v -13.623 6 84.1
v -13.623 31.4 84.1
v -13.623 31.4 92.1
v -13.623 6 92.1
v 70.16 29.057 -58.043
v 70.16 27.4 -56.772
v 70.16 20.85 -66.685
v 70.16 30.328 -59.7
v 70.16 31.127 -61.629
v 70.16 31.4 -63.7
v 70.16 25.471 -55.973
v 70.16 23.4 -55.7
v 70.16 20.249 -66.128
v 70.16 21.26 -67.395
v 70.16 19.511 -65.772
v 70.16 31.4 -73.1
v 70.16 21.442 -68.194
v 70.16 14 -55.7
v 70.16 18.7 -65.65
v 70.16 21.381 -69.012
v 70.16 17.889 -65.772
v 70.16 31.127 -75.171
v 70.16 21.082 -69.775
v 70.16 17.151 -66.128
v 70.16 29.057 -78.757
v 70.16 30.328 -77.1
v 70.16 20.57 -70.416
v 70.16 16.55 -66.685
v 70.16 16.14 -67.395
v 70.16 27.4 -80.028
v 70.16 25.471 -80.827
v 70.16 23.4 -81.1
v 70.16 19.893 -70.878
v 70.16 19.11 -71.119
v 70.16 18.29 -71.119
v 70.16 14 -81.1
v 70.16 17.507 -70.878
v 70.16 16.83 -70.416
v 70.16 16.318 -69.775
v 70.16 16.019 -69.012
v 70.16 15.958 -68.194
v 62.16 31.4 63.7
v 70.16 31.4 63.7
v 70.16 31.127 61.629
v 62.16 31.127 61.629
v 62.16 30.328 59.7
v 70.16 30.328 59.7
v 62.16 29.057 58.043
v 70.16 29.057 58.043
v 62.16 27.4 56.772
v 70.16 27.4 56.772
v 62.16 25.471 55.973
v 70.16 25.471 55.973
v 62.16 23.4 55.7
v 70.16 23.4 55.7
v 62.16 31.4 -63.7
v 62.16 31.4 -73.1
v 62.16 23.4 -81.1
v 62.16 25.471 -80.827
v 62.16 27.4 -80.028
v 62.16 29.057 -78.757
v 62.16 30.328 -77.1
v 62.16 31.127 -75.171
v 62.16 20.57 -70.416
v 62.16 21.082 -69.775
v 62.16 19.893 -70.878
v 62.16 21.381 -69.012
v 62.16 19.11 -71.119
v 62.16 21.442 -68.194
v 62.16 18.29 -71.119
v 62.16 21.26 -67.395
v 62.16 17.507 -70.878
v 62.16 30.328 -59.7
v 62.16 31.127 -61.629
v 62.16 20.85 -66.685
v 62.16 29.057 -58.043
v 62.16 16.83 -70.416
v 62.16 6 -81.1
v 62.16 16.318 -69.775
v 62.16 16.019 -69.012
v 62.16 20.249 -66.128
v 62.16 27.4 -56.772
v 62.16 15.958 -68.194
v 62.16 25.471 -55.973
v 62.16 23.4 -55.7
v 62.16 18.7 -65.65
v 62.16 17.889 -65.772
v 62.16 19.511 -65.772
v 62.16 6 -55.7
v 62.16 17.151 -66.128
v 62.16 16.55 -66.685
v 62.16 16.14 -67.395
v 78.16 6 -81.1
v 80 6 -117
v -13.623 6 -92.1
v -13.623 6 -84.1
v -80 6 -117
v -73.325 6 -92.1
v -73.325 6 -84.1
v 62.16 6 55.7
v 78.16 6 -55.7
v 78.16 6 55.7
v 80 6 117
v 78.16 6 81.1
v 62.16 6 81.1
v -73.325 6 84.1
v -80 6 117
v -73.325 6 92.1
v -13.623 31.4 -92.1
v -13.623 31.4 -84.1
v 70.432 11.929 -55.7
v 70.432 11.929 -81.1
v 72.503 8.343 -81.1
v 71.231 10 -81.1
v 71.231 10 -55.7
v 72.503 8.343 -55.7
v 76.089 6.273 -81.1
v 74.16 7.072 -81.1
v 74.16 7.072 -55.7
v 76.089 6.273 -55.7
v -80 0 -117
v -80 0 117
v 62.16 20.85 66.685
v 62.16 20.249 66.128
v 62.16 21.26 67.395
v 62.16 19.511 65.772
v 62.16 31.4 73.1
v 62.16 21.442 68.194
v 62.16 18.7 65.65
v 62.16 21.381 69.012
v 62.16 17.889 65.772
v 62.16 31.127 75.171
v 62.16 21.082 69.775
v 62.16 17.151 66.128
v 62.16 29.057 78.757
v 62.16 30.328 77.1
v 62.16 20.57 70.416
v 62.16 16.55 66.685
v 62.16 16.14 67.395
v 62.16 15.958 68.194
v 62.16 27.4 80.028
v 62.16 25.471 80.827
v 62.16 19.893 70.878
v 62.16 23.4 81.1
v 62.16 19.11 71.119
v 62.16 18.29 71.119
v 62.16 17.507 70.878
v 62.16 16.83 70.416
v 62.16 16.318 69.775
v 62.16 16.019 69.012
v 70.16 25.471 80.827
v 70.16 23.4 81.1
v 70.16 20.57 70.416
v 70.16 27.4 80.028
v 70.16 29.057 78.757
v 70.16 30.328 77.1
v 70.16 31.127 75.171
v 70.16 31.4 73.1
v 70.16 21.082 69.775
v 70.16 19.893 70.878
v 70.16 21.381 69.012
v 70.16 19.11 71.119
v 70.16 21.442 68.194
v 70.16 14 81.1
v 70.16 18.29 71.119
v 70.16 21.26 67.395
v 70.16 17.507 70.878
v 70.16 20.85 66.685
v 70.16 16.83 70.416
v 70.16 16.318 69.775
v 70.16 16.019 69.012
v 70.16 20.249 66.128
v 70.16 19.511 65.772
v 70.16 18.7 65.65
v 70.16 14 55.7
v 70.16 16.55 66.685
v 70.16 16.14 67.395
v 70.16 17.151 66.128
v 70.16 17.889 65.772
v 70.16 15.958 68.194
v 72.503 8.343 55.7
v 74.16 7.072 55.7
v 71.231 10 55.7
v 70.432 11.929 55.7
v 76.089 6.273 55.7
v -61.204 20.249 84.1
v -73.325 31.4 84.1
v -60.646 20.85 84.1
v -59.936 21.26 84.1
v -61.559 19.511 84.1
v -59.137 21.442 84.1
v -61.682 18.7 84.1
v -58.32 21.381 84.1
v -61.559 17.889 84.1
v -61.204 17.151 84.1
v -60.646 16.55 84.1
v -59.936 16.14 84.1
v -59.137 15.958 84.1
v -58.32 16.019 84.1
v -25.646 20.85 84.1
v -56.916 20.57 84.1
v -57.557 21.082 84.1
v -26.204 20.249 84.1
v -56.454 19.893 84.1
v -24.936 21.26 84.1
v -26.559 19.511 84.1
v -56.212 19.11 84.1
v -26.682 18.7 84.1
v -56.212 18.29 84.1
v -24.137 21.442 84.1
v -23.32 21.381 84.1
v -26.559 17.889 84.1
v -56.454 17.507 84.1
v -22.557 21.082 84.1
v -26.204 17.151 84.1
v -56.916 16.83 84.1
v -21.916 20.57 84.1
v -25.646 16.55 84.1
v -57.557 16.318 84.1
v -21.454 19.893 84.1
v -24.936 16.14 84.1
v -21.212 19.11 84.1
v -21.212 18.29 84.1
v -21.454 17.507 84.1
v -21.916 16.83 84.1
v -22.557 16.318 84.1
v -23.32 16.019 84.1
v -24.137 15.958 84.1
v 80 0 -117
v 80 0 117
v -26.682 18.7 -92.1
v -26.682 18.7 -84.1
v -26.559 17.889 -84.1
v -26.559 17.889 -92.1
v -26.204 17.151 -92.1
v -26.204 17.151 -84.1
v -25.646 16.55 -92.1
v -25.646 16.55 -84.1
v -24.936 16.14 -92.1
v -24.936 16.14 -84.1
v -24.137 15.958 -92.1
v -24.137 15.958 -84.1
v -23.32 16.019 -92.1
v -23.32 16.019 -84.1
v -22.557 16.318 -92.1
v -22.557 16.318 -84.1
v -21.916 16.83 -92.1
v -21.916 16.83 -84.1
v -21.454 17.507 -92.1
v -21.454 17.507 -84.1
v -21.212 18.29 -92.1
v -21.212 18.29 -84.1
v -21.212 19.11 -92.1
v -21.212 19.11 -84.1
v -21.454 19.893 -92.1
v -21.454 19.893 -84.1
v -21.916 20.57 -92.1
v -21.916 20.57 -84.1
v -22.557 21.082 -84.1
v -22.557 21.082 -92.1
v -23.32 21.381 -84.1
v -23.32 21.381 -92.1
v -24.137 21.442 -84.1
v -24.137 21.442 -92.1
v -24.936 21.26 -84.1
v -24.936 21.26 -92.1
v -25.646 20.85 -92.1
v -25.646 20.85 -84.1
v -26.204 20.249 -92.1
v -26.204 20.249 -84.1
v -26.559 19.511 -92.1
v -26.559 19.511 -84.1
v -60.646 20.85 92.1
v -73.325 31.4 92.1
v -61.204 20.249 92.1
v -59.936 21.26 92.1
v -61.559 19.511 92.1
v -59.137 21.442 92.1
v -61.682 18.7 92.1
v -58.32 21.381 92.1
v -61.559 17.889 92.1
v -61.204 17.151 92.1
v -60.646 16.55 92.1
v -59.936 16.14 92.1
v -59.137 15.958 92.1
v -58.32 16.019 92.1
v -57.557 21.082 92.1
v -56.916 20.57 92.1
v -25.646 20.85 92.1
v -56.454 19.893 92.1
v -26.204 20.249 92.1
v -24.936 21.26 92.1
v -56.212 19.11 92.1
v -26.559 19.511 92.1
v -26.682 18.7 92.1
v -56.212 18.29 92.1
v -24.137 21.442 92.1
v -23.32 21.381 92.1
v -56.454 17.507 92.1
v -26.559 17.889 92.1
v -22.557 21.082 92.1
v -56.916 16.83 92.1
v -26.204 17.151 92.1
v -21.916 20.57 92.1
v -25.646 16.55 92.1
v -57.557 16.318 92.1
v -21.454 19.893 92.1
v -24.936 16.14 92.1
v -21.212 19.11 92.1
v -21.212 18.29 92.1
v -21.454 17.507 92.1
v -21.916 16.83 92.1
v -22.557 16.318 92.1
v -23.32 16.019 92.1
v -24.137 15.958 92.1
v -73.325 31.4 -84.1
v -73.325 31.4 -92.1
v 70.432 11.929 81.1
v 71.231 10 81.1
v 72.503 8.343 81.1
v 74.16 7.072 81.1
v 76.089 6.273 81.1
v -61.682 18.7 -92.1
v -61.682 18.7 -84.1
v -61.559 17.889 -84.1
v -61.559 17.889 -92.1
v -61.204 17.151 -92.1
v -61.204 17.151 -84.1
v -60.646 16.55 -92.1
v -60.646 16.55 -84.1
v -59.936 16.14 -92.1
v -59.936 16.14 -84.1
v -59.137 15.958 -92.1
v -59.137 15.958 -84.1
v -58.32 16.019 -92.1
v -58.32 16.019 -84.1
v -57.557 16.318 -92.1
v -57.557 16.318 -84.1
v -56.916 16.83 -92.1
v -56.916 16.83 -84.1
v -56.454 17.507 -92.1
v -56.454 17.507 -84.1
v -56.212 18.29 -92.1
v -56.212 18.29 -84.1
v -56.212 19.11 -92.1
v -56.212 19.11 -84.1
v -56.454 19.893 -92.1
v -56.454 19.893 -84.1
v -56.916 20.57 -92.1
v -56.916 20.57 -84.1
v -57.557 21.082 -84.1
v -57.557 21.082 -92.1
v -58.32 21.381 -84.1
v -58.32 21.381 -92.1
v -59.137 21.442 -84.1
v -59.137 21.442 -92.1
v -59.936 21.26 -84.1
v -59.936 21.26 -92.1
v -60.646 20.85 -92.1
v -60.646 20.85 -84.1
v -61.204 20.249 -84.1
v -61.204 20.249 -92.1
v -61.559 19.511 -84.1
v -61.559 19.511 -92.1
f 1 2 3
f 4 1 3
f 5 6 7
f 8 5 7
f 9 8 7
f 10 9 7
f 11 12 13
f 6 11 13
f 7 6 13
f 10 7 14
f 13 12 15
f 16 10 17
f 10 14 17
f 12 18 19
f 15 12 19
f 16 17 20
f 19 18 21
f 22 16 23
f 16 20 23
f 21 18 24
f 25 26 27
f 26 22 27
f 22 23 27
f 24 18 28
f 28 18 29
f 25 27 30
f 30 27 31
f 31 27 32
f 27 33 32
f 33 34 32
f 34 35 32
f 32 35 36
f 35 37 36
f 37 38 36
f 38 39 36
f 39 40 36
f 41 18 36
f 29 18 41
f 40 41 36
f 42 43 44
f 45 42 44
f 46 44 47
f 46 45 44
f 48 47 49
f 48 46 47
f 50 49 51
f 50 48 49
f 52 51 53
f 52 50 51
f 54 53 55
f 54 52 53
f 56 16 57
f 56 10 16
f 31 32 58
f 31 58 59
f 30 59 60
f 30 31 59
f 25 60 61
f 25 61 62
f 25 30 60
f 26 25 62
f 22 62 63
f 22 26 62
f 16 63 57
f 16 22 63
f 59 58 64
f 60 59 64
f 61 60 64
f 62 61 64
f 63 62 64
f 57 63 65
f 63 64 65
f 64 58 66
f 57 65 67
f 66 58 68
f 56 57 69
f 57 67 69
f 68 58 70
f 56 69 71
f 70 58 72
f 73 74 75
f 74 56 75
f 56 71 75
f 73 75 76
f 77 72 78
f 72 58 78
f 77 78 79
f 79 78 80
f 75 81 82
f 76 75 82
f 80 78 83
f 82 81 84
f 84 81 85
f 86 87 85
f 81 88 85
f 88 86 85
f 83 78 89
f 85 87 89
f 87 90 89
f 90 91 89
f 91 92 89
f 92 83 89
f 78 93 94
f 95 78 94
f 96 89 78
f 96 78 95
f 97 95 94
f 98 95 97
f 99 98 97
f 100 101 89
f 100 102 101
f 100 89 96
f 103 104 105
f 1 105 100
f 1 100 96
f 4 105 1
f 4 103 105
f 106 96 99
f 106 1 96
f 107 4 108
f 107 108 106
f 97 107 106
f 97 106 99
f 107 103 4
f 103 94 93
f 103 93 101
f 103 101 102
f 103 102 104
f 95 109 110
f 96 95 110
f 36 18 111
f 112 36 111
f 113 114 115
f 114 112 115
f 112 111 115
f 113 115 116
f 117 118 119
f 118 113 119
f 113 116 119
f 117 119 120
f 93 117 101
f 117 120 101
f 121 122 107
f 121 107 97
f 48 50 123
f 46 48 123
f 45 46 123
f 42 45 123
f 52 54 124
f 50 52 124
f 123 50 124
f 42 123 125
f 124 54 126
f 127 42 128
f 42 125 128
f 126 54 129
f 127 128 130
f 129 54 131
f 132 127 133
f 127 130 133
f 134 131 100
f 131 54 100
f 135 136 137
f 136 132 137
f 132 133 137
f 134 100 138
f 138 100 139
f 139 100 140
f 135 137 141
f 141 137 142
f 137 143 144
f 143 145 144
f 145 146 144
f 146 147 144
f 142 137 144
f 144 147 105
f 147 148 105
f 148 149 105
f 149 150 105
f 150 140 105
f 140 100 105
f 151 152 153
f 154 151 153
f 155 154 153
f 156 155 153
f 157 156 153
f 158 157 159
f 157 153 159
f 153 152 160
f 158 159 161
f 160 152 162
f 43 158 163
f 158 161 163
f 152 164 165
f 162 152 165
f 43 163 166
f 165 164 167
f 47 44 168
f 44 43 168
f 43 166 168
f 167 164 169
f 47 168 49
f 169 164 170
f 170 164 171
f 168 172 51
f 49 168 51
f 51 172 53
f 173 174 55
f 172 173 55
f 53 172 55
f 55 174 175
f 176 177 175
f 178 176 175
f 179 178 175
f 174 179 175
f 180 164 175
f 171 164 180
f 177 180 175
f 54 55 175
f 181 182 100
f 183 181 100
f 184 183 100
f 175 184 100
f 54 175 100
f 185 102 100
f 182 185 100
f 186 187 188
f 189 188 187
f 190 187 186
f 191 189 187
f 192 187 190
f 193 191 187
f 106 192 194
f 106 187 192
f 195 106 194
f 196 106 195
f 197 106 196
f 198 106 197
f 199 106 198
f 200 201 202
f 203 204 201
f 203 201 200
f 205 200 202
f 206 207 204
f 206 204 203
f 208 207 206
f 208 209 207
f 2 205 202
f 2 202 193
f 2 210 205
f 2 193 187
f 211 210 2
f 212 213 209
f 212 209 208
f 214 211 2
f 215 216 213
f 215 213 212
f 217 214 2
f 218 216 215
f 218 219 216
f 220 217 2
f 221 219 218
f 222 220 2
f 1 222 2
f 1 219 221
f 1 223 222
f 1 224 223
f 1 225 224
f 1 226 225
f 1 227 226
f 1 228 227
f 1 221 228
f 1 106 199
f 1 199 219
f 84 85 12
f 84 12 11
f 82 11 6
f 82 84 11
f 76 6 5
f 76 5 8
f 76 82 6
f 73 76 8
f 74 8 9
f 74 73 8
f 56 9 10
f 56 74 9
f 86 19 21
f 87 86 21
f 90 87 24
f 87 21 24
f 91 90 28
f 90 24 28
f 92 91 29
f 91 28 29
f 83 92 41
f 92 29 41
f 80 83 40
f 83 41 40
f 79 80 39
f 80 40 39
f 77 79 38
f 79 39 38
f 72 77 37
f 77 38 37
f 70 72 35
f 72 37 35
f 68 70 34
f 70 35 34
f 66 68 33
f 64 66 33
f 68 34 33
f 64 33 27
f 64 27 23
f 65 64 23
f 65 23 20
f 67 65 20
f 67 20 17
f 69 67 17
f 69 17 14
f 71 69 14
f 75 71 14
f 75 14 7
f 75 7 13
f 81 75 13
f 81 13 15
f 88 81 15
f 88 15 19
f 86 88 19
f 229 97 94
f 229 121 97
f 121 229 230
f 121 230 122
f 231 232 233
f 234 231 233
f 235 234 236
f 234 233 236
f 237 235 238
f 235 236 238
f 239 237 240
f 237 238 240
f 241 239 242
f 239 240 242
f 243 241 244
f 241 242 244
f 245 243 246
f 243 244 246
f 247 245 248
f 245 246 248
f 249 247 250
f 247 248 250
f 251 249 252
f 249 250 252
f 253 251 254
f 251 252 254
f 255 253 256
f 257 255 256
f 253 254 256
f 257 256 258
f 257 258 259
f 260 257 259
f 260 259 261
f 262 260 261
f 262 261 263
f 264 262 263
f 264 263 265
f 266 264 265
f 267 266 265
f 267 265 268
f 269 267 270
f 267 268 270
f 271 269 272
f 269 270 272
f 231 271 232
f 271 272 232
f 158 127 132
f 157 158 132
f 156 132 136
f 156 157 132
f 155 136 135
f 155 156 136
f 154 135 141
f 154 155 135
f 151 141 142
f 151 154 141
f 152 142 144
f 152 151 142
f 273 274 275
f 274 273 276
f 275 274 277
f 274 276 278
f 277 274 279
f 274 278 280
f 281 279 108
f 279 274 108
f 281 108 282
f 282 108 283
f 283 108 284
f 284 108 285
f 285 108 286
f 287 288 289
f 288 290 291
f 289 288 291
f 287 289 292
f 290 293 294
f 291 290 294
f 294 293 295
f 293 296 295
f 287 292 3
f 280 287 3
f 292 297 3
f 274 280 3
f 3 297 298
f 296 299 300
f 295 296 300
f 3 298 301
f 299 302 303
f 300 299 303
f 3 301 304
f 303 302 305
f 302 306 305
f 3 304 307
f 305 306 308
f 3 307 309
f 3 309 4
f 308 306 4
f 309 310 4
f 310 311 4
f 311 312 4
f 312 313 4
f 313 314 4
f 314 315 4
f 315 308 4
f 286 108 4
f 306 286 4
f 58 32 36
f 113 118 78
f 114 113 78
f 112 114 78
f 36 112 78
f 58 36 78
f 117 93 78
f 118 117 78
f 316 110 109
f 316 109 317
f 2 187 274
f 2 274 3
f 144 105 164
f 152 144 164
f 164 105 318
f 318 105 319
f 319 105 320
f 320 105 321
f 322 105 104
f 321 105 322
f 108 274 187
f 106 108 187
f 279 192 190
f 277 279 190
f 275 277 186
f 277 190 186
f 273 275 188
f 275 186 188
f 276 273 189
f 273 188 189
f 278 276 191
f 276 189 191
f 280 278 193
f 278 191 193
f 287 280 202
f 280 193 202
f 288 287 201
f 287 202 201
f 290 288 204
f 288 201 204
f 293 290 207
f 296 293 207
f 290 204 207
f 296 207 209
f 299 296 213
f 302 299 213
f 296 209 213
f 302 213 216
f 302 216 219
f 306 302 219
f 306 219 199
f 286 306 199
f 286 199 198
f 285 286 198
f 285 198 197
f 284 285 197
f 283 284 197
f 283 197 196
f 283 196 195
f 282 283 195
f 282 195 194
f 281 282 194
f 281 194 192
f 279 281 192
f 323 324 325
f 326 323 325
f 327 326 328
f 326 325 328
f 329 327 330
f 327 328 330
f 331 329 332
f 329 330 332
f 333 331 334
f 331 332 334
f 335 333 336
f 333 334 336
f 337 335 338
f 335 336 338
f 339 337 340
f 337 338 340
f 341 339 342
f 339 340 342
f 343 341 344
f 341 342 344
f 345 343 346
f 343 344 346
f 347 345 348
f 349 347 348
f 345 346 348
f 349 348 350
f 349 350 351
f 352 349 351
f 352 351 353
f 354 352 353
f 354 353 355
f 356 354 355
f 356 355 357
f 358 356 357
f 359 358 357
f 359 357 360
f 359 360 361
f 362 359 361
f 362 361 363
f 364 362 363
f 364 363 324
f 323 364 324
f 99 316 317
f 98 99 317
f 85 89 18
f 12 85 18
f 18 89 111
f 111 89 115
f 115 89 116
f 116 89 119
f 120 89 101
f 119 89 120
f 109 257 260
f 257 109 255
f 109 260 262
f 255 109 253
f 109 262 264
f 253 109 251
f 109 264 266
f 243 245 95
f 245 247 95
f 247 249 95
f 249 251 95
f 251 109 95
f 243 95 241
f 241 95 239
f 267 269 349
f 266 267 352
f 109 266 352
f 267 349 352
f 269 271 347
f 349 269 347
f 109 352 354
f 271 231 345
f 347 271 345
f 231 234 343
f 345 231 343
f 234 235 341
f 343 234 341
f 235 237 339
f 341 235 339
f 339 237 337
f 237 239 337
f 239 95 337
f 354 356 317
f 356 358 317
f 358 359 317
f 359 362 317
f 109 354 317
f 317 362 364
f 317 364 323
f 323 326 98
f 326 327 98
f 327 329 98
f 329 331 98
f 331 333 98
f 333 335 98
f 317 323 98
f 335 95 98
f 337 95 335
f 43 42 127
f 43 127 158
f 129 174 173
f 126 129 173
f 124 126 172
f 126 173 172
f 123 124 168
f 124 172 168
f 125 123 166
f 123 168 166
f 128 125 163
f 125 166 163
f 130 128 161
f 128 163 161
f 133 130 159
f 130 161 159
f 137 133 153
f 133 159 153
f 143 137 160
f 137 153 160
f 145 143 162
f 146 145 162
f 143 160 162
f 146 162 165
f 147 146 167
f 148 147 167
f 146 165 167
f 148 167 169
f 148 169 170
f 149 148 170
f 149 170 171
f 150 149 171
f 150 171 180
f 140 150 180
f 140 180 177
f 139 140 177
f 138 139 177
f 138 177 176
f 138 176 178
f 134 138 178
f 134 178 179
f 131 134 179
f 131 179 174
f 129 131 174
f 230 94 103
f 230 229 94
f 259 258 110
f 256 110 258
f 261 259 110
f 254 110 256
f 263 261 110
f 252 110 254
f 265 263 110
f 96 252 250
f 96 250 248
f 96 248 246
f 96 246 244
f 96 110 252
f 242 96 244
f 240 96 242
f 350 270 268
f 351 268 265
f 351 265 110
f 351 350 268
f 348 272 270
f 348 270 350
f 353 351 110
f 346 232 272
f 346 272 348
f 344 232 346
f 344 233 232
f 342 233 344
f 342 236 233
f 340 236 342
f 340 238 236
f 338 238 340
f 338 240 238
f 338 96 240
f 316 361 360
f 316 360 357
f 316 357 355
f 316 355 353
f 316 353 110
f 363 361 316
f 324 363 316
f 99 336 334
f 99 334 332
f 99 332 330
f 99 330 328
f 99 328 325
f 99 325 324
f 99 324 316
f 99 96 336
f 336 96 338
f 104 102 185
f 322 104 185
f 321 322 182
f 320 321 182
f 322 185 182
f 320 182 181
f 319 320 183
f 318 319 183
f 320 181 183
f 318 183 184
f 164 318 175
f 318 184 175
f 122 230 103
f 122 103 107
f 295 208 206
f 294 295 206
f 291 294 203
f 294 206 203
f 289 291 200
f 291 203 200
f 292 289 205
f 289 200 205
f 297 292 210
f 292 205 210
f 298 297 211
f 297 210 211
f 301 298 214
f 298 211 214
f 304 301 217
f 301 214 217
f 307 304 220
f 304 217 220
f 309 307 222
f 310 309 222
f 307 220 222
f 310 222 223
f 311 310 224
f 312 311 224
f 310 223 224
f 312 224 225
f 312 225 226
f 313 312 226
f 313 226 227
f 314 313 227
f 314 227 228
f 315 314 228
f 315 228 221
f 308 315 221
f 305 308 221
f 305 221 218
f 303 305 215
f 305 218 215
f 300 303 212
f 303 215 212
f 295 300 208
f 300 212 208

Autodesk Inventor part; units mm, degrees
ref_plane "YZ Plane" through (0, 0, 0) normal (1, 0, 0) x (0, 1, 0)
ref_plane "XZ Plane" through (0, 0, 0) normal (0, 1, 0) x (-1, 0, 0)
ref_plane "XY Plane" through (0, 0, 0) normal (0, 0, 1) x (1, 0, 0)
sketch "Sketch1" plane through (0, 0, 0) normal (0, 1, 0) x (-1, 0, 0)
  line L0 (-80, 117) -> (80, 117)
  line L1 (80, 117) -> (80, -117)
  line L2 (80, -117) -> (-80, -117)
  line L3 (-80, -117) -> (-80, 117)
  line L4 (-80, 117) -> (80, -117) construction
  line L5 (80, 117) -> (-80, -117) construction
  point P0 (0, 0)
  dimension "d0" = 160
  dimension "d1" = 234
extrude "Extrusion1" add sketch "Sketch1" along normal blind 6
sketch "Sketch2" plane through (0, 6, 0) normal (0, 1, 0) x (1, 0, 0)
  line L0 (80, 117) -> (-80, 117) projected
  line L1 (-80, 117) -> (-80, -117) projected
  line L2 (-80, -117) -> (80, -117) projected
  line L3 (80, -117) -> (80, 117) projected
  line L4 (76.2612, -82.1) -> (62.1597, -82.1) projected
  line L5 (62.1597, 116.5) -> (62.1597, -117.5) projected
  line L6 (62.1597, -82.1) -> (70.1597, -82.1)
  line L7 (70.1597, -82.1) -> (70.1597, -55.7)
  line L8 (70.1597, -55.7) -> (62.1597, -55.7)
  line L9 (62.1597, -55.7) -> (62.1597, -82.1)
  line L10 (70.1597, -82.1) -> (62.1597, -82.1)
  line L11 (62.1597, -82.1) -> (62.1597, -81.1)
  line L12 (62.1597, -81.1) -> (70.1597, -81.1)
  line L13 (70.1597, -81.1) -> (70.1597, -82.1)
  point P0 (0, 0)
  point P1 (66.1597, -55.7)
  point P2 (66.1597, -82.1)
  point P3 (62.1597, -55.7)
  dimension "d4" = 26.4
  dimension "d5" = 8
  dimension "d8" = 1
extrude "Extrusion2" add sketch "Sketch2" along normal blind 25.4 contours L5 L8 L7 L12
sketch "Sketch3" plane through (70.1597, 6, 81.1) normal (1, 0, 0) x (0, 0, -1)
  line L0 (25.4, 0) -> (0, 0) projected
  line L1 (25.4, 0) -> (25.4, 25.4) projected
  line L2 (0, 25.4) -> (25.4, 25.4) projected
  line L3 (0, 0) -> (0, 25.4) projected
  circle A0 centre (12.7, 12.7) radius 2.75
  point P0 (81.1, -6)
  dimension "d9" = 5.5
extrude "Extrusion3" cut sketch "Sketch3" against normal blind 25.4 contours A0
fillet "Fillet1" radius 8 3 edges at (70.1597, 6, 68.4) (66.1597, 31.4, 55.7) (66.1597, 31.4, 81.1)
sketch "Sketch4" plane through (0, 6, 0) normal (0, 1, 0) x (1, 0, 0)
  line L0 (78.1597, -81.1) -> (62.1597, -81.1) projected
  line L1 (62.1597, -81.1) -> (62.1597, -55.7) projected
  line L2 (62.1597, -55.7) -> (78.1597, -55.7) projected
  line L3 (78.1597, -81.1) -> (78.1597, -55.7) projected
  line L4 (80, 117) -> (-80, 117) projected
  line L5 (-80, 117) -> (-80, -117) projected
  line L6 (-80, -117) -> (80, -117) projected
  line L7 (80, -117) -> (80, 117) projected
  line L8 (-217.2403, -92.1) -> (36.7597, -92.1) projected
  line L9 (-7.3833, -87.6172) -> (32.2769, -47.957) projected
  line L10 (-13.6234, -92.1) -> (-73.3252, -92.1)
  line L11 (-73.3252, -92.1) -> (-73.3252, -84.1)
  line L12 (-73.3252, -84.1) -> (-13.6234, -84.1)
  line L13 (-13.6234, -84.1) -> (-13.6234, -92.1)
  point P0 (0, 0)
  point P1 (-73.3252, -92.1)
  dimension "d14" = 8
extrude "Extrusion4" add sketch "Sketch4" along normal blind 25.4 contours L11 L12 L13 L8
sketch "Sketch5" plane through (-80, 6, 84.1) normal (0, 0, -1) x (-1, 0, 0)
  line L0 (-6.6748, 0) -> (-66.3766, 0) projected
  line L1 (-6.6748, 0) -> (-6.6748, 25.4) projected
  line L2 (-66.3766, 25.4) -> (-6.6748, 25.4) projected
  line L3 (-66.3766, 0) -> (-66.3766, 25.4) projected
  circle A0 centre (-56.0684, 12.7) radius 2.75
  circle A1 centre (-21.0684, 12.7) radius 2.75
  circle A2 centre (13.9316, 12.7) radius 2.75
  point P0 (-80, -6)
  dimension "d17" = 5.5
  dimension "d22" = 35
extrude "Extrusion5" cut sketch "Sketch5" against normal blind 25.4 contours A0 | A1 | A2
mirror "Mirror1" about plane through (0, 0, 0) normal (0, 0, 1) of "Extrusion2", "Extrusion3", "Fillet1", "Extrusion4", "Extrusion5"
sketch "Sketch6" plane through (0, 6, 0) normal (0, 1, 0) x (1, 0, 0)
  line L0 (-13.6234, 84.1) -> (-73.3252, 84.1) projected
  line L1 (-73.3252, 84.1) -> (-73.3252, 92.1) projected
  line L2 (-73.3252, 92.1) -> (-13.6234, 92.1) projected
  line L3 (-13.6234, 92.1) -> (-13.6234, 84.1) projected
  line L4 (78.1597, 55.7) -> (62.1597, 55.7) projected
  line L5 (62.1597, 55.7) -> (62.1597, 81.1) projected
  line L6 (62.1597, 81.1) -> (78.1597, 81.1) projected
  line L7 (78.1597, 55.7) -> (78.1597, 81.1) projected
  line L8 (-73.3252, -84.1) -> (-13.6234, -84.1) projected
  line L9 (-13.6234, -84.1) -> (-13.6234, -92.1) projected
  line L10 (-13.6234, -92.1) -> (-73.3252, -92.1) projected
  line L11 (-73.3252, -92.1) -> (-73.3252, -84.1) projected
  line L12 (78.1597, -81.1) -> (62.1597, -81.1) projected
  line L13 (62.1597, -81.1) -> (62.1597, -55.7) projected
  line L14 (62.1597, -55.7) -> (78.1597, -55.7) projected
  line L15 (78.1597, -81.1) -> (78.1597, -55.7) projected
  line L16 (80, 117) -> (-80, 117) projected
  line L17 (-80, 117) -> (-80, -117) projected
  line L18 (-80, -117) -> (80, -117) projected
  line L19 (80, -117) -> (80, 117) projected
  line L20 (-14.0403, 77.5) -> (-69.0403, 77.5)
  line L21 (-69.0403, 77.5) -> (-69.0403, -77.5)
  line L22 (-69.0403, -77.5) -> (-14.0403, -77.5)
  line L23 (-14.0403, -77.5) -> (-14.0403, 77.5)
  line L24 (-14.0403, 77.5) -> (-69.0403, -77.5) construction
  line L25 (-69.0403, 77.5) -> (-14.0403, -77.5) construction
  line L26 (80, -117) -> (80, 117) projected
  line L27 (80, 0) -> (-80, 0)
  line L28 (-9.0403, -82.5) -> (-74.0403, -82.5)
  line L29 (-74.0403, -82.5) -> (-74.0403, 82.5)
  line L30 (-74.0403, 82.5) -> (-9.0403, 82.5)
  line L31 (-9.0403, 82.5) -> (-9.0403, -82.5)
  point P0 (0, 0)
  point P1 (-41.5403, 0)
  dimension "d27" = 155
  dimension "d28" = 55
  dimension "d29" = 76.2
  dimension "d30" = 5
sketch "Sketch7" plane through (0, 6, 0) normal (0, 1, 0) x (1, 0, 0)
  line L0 (-14.0403, 77.5) -> (-69.0403, 77.5) projected
  line L1 (-69.0403, 77.5) -> (-69.0403, -77.5) projected
  line L2 (-69.0403, -77.5) -> (-14.0403, -77.5) projected
  line L3 (-14.0403, -77.5) -> (-14.0403, 77.5) projected
  point P0 (0, 0)
properties part number "lowerSkidPlate"
